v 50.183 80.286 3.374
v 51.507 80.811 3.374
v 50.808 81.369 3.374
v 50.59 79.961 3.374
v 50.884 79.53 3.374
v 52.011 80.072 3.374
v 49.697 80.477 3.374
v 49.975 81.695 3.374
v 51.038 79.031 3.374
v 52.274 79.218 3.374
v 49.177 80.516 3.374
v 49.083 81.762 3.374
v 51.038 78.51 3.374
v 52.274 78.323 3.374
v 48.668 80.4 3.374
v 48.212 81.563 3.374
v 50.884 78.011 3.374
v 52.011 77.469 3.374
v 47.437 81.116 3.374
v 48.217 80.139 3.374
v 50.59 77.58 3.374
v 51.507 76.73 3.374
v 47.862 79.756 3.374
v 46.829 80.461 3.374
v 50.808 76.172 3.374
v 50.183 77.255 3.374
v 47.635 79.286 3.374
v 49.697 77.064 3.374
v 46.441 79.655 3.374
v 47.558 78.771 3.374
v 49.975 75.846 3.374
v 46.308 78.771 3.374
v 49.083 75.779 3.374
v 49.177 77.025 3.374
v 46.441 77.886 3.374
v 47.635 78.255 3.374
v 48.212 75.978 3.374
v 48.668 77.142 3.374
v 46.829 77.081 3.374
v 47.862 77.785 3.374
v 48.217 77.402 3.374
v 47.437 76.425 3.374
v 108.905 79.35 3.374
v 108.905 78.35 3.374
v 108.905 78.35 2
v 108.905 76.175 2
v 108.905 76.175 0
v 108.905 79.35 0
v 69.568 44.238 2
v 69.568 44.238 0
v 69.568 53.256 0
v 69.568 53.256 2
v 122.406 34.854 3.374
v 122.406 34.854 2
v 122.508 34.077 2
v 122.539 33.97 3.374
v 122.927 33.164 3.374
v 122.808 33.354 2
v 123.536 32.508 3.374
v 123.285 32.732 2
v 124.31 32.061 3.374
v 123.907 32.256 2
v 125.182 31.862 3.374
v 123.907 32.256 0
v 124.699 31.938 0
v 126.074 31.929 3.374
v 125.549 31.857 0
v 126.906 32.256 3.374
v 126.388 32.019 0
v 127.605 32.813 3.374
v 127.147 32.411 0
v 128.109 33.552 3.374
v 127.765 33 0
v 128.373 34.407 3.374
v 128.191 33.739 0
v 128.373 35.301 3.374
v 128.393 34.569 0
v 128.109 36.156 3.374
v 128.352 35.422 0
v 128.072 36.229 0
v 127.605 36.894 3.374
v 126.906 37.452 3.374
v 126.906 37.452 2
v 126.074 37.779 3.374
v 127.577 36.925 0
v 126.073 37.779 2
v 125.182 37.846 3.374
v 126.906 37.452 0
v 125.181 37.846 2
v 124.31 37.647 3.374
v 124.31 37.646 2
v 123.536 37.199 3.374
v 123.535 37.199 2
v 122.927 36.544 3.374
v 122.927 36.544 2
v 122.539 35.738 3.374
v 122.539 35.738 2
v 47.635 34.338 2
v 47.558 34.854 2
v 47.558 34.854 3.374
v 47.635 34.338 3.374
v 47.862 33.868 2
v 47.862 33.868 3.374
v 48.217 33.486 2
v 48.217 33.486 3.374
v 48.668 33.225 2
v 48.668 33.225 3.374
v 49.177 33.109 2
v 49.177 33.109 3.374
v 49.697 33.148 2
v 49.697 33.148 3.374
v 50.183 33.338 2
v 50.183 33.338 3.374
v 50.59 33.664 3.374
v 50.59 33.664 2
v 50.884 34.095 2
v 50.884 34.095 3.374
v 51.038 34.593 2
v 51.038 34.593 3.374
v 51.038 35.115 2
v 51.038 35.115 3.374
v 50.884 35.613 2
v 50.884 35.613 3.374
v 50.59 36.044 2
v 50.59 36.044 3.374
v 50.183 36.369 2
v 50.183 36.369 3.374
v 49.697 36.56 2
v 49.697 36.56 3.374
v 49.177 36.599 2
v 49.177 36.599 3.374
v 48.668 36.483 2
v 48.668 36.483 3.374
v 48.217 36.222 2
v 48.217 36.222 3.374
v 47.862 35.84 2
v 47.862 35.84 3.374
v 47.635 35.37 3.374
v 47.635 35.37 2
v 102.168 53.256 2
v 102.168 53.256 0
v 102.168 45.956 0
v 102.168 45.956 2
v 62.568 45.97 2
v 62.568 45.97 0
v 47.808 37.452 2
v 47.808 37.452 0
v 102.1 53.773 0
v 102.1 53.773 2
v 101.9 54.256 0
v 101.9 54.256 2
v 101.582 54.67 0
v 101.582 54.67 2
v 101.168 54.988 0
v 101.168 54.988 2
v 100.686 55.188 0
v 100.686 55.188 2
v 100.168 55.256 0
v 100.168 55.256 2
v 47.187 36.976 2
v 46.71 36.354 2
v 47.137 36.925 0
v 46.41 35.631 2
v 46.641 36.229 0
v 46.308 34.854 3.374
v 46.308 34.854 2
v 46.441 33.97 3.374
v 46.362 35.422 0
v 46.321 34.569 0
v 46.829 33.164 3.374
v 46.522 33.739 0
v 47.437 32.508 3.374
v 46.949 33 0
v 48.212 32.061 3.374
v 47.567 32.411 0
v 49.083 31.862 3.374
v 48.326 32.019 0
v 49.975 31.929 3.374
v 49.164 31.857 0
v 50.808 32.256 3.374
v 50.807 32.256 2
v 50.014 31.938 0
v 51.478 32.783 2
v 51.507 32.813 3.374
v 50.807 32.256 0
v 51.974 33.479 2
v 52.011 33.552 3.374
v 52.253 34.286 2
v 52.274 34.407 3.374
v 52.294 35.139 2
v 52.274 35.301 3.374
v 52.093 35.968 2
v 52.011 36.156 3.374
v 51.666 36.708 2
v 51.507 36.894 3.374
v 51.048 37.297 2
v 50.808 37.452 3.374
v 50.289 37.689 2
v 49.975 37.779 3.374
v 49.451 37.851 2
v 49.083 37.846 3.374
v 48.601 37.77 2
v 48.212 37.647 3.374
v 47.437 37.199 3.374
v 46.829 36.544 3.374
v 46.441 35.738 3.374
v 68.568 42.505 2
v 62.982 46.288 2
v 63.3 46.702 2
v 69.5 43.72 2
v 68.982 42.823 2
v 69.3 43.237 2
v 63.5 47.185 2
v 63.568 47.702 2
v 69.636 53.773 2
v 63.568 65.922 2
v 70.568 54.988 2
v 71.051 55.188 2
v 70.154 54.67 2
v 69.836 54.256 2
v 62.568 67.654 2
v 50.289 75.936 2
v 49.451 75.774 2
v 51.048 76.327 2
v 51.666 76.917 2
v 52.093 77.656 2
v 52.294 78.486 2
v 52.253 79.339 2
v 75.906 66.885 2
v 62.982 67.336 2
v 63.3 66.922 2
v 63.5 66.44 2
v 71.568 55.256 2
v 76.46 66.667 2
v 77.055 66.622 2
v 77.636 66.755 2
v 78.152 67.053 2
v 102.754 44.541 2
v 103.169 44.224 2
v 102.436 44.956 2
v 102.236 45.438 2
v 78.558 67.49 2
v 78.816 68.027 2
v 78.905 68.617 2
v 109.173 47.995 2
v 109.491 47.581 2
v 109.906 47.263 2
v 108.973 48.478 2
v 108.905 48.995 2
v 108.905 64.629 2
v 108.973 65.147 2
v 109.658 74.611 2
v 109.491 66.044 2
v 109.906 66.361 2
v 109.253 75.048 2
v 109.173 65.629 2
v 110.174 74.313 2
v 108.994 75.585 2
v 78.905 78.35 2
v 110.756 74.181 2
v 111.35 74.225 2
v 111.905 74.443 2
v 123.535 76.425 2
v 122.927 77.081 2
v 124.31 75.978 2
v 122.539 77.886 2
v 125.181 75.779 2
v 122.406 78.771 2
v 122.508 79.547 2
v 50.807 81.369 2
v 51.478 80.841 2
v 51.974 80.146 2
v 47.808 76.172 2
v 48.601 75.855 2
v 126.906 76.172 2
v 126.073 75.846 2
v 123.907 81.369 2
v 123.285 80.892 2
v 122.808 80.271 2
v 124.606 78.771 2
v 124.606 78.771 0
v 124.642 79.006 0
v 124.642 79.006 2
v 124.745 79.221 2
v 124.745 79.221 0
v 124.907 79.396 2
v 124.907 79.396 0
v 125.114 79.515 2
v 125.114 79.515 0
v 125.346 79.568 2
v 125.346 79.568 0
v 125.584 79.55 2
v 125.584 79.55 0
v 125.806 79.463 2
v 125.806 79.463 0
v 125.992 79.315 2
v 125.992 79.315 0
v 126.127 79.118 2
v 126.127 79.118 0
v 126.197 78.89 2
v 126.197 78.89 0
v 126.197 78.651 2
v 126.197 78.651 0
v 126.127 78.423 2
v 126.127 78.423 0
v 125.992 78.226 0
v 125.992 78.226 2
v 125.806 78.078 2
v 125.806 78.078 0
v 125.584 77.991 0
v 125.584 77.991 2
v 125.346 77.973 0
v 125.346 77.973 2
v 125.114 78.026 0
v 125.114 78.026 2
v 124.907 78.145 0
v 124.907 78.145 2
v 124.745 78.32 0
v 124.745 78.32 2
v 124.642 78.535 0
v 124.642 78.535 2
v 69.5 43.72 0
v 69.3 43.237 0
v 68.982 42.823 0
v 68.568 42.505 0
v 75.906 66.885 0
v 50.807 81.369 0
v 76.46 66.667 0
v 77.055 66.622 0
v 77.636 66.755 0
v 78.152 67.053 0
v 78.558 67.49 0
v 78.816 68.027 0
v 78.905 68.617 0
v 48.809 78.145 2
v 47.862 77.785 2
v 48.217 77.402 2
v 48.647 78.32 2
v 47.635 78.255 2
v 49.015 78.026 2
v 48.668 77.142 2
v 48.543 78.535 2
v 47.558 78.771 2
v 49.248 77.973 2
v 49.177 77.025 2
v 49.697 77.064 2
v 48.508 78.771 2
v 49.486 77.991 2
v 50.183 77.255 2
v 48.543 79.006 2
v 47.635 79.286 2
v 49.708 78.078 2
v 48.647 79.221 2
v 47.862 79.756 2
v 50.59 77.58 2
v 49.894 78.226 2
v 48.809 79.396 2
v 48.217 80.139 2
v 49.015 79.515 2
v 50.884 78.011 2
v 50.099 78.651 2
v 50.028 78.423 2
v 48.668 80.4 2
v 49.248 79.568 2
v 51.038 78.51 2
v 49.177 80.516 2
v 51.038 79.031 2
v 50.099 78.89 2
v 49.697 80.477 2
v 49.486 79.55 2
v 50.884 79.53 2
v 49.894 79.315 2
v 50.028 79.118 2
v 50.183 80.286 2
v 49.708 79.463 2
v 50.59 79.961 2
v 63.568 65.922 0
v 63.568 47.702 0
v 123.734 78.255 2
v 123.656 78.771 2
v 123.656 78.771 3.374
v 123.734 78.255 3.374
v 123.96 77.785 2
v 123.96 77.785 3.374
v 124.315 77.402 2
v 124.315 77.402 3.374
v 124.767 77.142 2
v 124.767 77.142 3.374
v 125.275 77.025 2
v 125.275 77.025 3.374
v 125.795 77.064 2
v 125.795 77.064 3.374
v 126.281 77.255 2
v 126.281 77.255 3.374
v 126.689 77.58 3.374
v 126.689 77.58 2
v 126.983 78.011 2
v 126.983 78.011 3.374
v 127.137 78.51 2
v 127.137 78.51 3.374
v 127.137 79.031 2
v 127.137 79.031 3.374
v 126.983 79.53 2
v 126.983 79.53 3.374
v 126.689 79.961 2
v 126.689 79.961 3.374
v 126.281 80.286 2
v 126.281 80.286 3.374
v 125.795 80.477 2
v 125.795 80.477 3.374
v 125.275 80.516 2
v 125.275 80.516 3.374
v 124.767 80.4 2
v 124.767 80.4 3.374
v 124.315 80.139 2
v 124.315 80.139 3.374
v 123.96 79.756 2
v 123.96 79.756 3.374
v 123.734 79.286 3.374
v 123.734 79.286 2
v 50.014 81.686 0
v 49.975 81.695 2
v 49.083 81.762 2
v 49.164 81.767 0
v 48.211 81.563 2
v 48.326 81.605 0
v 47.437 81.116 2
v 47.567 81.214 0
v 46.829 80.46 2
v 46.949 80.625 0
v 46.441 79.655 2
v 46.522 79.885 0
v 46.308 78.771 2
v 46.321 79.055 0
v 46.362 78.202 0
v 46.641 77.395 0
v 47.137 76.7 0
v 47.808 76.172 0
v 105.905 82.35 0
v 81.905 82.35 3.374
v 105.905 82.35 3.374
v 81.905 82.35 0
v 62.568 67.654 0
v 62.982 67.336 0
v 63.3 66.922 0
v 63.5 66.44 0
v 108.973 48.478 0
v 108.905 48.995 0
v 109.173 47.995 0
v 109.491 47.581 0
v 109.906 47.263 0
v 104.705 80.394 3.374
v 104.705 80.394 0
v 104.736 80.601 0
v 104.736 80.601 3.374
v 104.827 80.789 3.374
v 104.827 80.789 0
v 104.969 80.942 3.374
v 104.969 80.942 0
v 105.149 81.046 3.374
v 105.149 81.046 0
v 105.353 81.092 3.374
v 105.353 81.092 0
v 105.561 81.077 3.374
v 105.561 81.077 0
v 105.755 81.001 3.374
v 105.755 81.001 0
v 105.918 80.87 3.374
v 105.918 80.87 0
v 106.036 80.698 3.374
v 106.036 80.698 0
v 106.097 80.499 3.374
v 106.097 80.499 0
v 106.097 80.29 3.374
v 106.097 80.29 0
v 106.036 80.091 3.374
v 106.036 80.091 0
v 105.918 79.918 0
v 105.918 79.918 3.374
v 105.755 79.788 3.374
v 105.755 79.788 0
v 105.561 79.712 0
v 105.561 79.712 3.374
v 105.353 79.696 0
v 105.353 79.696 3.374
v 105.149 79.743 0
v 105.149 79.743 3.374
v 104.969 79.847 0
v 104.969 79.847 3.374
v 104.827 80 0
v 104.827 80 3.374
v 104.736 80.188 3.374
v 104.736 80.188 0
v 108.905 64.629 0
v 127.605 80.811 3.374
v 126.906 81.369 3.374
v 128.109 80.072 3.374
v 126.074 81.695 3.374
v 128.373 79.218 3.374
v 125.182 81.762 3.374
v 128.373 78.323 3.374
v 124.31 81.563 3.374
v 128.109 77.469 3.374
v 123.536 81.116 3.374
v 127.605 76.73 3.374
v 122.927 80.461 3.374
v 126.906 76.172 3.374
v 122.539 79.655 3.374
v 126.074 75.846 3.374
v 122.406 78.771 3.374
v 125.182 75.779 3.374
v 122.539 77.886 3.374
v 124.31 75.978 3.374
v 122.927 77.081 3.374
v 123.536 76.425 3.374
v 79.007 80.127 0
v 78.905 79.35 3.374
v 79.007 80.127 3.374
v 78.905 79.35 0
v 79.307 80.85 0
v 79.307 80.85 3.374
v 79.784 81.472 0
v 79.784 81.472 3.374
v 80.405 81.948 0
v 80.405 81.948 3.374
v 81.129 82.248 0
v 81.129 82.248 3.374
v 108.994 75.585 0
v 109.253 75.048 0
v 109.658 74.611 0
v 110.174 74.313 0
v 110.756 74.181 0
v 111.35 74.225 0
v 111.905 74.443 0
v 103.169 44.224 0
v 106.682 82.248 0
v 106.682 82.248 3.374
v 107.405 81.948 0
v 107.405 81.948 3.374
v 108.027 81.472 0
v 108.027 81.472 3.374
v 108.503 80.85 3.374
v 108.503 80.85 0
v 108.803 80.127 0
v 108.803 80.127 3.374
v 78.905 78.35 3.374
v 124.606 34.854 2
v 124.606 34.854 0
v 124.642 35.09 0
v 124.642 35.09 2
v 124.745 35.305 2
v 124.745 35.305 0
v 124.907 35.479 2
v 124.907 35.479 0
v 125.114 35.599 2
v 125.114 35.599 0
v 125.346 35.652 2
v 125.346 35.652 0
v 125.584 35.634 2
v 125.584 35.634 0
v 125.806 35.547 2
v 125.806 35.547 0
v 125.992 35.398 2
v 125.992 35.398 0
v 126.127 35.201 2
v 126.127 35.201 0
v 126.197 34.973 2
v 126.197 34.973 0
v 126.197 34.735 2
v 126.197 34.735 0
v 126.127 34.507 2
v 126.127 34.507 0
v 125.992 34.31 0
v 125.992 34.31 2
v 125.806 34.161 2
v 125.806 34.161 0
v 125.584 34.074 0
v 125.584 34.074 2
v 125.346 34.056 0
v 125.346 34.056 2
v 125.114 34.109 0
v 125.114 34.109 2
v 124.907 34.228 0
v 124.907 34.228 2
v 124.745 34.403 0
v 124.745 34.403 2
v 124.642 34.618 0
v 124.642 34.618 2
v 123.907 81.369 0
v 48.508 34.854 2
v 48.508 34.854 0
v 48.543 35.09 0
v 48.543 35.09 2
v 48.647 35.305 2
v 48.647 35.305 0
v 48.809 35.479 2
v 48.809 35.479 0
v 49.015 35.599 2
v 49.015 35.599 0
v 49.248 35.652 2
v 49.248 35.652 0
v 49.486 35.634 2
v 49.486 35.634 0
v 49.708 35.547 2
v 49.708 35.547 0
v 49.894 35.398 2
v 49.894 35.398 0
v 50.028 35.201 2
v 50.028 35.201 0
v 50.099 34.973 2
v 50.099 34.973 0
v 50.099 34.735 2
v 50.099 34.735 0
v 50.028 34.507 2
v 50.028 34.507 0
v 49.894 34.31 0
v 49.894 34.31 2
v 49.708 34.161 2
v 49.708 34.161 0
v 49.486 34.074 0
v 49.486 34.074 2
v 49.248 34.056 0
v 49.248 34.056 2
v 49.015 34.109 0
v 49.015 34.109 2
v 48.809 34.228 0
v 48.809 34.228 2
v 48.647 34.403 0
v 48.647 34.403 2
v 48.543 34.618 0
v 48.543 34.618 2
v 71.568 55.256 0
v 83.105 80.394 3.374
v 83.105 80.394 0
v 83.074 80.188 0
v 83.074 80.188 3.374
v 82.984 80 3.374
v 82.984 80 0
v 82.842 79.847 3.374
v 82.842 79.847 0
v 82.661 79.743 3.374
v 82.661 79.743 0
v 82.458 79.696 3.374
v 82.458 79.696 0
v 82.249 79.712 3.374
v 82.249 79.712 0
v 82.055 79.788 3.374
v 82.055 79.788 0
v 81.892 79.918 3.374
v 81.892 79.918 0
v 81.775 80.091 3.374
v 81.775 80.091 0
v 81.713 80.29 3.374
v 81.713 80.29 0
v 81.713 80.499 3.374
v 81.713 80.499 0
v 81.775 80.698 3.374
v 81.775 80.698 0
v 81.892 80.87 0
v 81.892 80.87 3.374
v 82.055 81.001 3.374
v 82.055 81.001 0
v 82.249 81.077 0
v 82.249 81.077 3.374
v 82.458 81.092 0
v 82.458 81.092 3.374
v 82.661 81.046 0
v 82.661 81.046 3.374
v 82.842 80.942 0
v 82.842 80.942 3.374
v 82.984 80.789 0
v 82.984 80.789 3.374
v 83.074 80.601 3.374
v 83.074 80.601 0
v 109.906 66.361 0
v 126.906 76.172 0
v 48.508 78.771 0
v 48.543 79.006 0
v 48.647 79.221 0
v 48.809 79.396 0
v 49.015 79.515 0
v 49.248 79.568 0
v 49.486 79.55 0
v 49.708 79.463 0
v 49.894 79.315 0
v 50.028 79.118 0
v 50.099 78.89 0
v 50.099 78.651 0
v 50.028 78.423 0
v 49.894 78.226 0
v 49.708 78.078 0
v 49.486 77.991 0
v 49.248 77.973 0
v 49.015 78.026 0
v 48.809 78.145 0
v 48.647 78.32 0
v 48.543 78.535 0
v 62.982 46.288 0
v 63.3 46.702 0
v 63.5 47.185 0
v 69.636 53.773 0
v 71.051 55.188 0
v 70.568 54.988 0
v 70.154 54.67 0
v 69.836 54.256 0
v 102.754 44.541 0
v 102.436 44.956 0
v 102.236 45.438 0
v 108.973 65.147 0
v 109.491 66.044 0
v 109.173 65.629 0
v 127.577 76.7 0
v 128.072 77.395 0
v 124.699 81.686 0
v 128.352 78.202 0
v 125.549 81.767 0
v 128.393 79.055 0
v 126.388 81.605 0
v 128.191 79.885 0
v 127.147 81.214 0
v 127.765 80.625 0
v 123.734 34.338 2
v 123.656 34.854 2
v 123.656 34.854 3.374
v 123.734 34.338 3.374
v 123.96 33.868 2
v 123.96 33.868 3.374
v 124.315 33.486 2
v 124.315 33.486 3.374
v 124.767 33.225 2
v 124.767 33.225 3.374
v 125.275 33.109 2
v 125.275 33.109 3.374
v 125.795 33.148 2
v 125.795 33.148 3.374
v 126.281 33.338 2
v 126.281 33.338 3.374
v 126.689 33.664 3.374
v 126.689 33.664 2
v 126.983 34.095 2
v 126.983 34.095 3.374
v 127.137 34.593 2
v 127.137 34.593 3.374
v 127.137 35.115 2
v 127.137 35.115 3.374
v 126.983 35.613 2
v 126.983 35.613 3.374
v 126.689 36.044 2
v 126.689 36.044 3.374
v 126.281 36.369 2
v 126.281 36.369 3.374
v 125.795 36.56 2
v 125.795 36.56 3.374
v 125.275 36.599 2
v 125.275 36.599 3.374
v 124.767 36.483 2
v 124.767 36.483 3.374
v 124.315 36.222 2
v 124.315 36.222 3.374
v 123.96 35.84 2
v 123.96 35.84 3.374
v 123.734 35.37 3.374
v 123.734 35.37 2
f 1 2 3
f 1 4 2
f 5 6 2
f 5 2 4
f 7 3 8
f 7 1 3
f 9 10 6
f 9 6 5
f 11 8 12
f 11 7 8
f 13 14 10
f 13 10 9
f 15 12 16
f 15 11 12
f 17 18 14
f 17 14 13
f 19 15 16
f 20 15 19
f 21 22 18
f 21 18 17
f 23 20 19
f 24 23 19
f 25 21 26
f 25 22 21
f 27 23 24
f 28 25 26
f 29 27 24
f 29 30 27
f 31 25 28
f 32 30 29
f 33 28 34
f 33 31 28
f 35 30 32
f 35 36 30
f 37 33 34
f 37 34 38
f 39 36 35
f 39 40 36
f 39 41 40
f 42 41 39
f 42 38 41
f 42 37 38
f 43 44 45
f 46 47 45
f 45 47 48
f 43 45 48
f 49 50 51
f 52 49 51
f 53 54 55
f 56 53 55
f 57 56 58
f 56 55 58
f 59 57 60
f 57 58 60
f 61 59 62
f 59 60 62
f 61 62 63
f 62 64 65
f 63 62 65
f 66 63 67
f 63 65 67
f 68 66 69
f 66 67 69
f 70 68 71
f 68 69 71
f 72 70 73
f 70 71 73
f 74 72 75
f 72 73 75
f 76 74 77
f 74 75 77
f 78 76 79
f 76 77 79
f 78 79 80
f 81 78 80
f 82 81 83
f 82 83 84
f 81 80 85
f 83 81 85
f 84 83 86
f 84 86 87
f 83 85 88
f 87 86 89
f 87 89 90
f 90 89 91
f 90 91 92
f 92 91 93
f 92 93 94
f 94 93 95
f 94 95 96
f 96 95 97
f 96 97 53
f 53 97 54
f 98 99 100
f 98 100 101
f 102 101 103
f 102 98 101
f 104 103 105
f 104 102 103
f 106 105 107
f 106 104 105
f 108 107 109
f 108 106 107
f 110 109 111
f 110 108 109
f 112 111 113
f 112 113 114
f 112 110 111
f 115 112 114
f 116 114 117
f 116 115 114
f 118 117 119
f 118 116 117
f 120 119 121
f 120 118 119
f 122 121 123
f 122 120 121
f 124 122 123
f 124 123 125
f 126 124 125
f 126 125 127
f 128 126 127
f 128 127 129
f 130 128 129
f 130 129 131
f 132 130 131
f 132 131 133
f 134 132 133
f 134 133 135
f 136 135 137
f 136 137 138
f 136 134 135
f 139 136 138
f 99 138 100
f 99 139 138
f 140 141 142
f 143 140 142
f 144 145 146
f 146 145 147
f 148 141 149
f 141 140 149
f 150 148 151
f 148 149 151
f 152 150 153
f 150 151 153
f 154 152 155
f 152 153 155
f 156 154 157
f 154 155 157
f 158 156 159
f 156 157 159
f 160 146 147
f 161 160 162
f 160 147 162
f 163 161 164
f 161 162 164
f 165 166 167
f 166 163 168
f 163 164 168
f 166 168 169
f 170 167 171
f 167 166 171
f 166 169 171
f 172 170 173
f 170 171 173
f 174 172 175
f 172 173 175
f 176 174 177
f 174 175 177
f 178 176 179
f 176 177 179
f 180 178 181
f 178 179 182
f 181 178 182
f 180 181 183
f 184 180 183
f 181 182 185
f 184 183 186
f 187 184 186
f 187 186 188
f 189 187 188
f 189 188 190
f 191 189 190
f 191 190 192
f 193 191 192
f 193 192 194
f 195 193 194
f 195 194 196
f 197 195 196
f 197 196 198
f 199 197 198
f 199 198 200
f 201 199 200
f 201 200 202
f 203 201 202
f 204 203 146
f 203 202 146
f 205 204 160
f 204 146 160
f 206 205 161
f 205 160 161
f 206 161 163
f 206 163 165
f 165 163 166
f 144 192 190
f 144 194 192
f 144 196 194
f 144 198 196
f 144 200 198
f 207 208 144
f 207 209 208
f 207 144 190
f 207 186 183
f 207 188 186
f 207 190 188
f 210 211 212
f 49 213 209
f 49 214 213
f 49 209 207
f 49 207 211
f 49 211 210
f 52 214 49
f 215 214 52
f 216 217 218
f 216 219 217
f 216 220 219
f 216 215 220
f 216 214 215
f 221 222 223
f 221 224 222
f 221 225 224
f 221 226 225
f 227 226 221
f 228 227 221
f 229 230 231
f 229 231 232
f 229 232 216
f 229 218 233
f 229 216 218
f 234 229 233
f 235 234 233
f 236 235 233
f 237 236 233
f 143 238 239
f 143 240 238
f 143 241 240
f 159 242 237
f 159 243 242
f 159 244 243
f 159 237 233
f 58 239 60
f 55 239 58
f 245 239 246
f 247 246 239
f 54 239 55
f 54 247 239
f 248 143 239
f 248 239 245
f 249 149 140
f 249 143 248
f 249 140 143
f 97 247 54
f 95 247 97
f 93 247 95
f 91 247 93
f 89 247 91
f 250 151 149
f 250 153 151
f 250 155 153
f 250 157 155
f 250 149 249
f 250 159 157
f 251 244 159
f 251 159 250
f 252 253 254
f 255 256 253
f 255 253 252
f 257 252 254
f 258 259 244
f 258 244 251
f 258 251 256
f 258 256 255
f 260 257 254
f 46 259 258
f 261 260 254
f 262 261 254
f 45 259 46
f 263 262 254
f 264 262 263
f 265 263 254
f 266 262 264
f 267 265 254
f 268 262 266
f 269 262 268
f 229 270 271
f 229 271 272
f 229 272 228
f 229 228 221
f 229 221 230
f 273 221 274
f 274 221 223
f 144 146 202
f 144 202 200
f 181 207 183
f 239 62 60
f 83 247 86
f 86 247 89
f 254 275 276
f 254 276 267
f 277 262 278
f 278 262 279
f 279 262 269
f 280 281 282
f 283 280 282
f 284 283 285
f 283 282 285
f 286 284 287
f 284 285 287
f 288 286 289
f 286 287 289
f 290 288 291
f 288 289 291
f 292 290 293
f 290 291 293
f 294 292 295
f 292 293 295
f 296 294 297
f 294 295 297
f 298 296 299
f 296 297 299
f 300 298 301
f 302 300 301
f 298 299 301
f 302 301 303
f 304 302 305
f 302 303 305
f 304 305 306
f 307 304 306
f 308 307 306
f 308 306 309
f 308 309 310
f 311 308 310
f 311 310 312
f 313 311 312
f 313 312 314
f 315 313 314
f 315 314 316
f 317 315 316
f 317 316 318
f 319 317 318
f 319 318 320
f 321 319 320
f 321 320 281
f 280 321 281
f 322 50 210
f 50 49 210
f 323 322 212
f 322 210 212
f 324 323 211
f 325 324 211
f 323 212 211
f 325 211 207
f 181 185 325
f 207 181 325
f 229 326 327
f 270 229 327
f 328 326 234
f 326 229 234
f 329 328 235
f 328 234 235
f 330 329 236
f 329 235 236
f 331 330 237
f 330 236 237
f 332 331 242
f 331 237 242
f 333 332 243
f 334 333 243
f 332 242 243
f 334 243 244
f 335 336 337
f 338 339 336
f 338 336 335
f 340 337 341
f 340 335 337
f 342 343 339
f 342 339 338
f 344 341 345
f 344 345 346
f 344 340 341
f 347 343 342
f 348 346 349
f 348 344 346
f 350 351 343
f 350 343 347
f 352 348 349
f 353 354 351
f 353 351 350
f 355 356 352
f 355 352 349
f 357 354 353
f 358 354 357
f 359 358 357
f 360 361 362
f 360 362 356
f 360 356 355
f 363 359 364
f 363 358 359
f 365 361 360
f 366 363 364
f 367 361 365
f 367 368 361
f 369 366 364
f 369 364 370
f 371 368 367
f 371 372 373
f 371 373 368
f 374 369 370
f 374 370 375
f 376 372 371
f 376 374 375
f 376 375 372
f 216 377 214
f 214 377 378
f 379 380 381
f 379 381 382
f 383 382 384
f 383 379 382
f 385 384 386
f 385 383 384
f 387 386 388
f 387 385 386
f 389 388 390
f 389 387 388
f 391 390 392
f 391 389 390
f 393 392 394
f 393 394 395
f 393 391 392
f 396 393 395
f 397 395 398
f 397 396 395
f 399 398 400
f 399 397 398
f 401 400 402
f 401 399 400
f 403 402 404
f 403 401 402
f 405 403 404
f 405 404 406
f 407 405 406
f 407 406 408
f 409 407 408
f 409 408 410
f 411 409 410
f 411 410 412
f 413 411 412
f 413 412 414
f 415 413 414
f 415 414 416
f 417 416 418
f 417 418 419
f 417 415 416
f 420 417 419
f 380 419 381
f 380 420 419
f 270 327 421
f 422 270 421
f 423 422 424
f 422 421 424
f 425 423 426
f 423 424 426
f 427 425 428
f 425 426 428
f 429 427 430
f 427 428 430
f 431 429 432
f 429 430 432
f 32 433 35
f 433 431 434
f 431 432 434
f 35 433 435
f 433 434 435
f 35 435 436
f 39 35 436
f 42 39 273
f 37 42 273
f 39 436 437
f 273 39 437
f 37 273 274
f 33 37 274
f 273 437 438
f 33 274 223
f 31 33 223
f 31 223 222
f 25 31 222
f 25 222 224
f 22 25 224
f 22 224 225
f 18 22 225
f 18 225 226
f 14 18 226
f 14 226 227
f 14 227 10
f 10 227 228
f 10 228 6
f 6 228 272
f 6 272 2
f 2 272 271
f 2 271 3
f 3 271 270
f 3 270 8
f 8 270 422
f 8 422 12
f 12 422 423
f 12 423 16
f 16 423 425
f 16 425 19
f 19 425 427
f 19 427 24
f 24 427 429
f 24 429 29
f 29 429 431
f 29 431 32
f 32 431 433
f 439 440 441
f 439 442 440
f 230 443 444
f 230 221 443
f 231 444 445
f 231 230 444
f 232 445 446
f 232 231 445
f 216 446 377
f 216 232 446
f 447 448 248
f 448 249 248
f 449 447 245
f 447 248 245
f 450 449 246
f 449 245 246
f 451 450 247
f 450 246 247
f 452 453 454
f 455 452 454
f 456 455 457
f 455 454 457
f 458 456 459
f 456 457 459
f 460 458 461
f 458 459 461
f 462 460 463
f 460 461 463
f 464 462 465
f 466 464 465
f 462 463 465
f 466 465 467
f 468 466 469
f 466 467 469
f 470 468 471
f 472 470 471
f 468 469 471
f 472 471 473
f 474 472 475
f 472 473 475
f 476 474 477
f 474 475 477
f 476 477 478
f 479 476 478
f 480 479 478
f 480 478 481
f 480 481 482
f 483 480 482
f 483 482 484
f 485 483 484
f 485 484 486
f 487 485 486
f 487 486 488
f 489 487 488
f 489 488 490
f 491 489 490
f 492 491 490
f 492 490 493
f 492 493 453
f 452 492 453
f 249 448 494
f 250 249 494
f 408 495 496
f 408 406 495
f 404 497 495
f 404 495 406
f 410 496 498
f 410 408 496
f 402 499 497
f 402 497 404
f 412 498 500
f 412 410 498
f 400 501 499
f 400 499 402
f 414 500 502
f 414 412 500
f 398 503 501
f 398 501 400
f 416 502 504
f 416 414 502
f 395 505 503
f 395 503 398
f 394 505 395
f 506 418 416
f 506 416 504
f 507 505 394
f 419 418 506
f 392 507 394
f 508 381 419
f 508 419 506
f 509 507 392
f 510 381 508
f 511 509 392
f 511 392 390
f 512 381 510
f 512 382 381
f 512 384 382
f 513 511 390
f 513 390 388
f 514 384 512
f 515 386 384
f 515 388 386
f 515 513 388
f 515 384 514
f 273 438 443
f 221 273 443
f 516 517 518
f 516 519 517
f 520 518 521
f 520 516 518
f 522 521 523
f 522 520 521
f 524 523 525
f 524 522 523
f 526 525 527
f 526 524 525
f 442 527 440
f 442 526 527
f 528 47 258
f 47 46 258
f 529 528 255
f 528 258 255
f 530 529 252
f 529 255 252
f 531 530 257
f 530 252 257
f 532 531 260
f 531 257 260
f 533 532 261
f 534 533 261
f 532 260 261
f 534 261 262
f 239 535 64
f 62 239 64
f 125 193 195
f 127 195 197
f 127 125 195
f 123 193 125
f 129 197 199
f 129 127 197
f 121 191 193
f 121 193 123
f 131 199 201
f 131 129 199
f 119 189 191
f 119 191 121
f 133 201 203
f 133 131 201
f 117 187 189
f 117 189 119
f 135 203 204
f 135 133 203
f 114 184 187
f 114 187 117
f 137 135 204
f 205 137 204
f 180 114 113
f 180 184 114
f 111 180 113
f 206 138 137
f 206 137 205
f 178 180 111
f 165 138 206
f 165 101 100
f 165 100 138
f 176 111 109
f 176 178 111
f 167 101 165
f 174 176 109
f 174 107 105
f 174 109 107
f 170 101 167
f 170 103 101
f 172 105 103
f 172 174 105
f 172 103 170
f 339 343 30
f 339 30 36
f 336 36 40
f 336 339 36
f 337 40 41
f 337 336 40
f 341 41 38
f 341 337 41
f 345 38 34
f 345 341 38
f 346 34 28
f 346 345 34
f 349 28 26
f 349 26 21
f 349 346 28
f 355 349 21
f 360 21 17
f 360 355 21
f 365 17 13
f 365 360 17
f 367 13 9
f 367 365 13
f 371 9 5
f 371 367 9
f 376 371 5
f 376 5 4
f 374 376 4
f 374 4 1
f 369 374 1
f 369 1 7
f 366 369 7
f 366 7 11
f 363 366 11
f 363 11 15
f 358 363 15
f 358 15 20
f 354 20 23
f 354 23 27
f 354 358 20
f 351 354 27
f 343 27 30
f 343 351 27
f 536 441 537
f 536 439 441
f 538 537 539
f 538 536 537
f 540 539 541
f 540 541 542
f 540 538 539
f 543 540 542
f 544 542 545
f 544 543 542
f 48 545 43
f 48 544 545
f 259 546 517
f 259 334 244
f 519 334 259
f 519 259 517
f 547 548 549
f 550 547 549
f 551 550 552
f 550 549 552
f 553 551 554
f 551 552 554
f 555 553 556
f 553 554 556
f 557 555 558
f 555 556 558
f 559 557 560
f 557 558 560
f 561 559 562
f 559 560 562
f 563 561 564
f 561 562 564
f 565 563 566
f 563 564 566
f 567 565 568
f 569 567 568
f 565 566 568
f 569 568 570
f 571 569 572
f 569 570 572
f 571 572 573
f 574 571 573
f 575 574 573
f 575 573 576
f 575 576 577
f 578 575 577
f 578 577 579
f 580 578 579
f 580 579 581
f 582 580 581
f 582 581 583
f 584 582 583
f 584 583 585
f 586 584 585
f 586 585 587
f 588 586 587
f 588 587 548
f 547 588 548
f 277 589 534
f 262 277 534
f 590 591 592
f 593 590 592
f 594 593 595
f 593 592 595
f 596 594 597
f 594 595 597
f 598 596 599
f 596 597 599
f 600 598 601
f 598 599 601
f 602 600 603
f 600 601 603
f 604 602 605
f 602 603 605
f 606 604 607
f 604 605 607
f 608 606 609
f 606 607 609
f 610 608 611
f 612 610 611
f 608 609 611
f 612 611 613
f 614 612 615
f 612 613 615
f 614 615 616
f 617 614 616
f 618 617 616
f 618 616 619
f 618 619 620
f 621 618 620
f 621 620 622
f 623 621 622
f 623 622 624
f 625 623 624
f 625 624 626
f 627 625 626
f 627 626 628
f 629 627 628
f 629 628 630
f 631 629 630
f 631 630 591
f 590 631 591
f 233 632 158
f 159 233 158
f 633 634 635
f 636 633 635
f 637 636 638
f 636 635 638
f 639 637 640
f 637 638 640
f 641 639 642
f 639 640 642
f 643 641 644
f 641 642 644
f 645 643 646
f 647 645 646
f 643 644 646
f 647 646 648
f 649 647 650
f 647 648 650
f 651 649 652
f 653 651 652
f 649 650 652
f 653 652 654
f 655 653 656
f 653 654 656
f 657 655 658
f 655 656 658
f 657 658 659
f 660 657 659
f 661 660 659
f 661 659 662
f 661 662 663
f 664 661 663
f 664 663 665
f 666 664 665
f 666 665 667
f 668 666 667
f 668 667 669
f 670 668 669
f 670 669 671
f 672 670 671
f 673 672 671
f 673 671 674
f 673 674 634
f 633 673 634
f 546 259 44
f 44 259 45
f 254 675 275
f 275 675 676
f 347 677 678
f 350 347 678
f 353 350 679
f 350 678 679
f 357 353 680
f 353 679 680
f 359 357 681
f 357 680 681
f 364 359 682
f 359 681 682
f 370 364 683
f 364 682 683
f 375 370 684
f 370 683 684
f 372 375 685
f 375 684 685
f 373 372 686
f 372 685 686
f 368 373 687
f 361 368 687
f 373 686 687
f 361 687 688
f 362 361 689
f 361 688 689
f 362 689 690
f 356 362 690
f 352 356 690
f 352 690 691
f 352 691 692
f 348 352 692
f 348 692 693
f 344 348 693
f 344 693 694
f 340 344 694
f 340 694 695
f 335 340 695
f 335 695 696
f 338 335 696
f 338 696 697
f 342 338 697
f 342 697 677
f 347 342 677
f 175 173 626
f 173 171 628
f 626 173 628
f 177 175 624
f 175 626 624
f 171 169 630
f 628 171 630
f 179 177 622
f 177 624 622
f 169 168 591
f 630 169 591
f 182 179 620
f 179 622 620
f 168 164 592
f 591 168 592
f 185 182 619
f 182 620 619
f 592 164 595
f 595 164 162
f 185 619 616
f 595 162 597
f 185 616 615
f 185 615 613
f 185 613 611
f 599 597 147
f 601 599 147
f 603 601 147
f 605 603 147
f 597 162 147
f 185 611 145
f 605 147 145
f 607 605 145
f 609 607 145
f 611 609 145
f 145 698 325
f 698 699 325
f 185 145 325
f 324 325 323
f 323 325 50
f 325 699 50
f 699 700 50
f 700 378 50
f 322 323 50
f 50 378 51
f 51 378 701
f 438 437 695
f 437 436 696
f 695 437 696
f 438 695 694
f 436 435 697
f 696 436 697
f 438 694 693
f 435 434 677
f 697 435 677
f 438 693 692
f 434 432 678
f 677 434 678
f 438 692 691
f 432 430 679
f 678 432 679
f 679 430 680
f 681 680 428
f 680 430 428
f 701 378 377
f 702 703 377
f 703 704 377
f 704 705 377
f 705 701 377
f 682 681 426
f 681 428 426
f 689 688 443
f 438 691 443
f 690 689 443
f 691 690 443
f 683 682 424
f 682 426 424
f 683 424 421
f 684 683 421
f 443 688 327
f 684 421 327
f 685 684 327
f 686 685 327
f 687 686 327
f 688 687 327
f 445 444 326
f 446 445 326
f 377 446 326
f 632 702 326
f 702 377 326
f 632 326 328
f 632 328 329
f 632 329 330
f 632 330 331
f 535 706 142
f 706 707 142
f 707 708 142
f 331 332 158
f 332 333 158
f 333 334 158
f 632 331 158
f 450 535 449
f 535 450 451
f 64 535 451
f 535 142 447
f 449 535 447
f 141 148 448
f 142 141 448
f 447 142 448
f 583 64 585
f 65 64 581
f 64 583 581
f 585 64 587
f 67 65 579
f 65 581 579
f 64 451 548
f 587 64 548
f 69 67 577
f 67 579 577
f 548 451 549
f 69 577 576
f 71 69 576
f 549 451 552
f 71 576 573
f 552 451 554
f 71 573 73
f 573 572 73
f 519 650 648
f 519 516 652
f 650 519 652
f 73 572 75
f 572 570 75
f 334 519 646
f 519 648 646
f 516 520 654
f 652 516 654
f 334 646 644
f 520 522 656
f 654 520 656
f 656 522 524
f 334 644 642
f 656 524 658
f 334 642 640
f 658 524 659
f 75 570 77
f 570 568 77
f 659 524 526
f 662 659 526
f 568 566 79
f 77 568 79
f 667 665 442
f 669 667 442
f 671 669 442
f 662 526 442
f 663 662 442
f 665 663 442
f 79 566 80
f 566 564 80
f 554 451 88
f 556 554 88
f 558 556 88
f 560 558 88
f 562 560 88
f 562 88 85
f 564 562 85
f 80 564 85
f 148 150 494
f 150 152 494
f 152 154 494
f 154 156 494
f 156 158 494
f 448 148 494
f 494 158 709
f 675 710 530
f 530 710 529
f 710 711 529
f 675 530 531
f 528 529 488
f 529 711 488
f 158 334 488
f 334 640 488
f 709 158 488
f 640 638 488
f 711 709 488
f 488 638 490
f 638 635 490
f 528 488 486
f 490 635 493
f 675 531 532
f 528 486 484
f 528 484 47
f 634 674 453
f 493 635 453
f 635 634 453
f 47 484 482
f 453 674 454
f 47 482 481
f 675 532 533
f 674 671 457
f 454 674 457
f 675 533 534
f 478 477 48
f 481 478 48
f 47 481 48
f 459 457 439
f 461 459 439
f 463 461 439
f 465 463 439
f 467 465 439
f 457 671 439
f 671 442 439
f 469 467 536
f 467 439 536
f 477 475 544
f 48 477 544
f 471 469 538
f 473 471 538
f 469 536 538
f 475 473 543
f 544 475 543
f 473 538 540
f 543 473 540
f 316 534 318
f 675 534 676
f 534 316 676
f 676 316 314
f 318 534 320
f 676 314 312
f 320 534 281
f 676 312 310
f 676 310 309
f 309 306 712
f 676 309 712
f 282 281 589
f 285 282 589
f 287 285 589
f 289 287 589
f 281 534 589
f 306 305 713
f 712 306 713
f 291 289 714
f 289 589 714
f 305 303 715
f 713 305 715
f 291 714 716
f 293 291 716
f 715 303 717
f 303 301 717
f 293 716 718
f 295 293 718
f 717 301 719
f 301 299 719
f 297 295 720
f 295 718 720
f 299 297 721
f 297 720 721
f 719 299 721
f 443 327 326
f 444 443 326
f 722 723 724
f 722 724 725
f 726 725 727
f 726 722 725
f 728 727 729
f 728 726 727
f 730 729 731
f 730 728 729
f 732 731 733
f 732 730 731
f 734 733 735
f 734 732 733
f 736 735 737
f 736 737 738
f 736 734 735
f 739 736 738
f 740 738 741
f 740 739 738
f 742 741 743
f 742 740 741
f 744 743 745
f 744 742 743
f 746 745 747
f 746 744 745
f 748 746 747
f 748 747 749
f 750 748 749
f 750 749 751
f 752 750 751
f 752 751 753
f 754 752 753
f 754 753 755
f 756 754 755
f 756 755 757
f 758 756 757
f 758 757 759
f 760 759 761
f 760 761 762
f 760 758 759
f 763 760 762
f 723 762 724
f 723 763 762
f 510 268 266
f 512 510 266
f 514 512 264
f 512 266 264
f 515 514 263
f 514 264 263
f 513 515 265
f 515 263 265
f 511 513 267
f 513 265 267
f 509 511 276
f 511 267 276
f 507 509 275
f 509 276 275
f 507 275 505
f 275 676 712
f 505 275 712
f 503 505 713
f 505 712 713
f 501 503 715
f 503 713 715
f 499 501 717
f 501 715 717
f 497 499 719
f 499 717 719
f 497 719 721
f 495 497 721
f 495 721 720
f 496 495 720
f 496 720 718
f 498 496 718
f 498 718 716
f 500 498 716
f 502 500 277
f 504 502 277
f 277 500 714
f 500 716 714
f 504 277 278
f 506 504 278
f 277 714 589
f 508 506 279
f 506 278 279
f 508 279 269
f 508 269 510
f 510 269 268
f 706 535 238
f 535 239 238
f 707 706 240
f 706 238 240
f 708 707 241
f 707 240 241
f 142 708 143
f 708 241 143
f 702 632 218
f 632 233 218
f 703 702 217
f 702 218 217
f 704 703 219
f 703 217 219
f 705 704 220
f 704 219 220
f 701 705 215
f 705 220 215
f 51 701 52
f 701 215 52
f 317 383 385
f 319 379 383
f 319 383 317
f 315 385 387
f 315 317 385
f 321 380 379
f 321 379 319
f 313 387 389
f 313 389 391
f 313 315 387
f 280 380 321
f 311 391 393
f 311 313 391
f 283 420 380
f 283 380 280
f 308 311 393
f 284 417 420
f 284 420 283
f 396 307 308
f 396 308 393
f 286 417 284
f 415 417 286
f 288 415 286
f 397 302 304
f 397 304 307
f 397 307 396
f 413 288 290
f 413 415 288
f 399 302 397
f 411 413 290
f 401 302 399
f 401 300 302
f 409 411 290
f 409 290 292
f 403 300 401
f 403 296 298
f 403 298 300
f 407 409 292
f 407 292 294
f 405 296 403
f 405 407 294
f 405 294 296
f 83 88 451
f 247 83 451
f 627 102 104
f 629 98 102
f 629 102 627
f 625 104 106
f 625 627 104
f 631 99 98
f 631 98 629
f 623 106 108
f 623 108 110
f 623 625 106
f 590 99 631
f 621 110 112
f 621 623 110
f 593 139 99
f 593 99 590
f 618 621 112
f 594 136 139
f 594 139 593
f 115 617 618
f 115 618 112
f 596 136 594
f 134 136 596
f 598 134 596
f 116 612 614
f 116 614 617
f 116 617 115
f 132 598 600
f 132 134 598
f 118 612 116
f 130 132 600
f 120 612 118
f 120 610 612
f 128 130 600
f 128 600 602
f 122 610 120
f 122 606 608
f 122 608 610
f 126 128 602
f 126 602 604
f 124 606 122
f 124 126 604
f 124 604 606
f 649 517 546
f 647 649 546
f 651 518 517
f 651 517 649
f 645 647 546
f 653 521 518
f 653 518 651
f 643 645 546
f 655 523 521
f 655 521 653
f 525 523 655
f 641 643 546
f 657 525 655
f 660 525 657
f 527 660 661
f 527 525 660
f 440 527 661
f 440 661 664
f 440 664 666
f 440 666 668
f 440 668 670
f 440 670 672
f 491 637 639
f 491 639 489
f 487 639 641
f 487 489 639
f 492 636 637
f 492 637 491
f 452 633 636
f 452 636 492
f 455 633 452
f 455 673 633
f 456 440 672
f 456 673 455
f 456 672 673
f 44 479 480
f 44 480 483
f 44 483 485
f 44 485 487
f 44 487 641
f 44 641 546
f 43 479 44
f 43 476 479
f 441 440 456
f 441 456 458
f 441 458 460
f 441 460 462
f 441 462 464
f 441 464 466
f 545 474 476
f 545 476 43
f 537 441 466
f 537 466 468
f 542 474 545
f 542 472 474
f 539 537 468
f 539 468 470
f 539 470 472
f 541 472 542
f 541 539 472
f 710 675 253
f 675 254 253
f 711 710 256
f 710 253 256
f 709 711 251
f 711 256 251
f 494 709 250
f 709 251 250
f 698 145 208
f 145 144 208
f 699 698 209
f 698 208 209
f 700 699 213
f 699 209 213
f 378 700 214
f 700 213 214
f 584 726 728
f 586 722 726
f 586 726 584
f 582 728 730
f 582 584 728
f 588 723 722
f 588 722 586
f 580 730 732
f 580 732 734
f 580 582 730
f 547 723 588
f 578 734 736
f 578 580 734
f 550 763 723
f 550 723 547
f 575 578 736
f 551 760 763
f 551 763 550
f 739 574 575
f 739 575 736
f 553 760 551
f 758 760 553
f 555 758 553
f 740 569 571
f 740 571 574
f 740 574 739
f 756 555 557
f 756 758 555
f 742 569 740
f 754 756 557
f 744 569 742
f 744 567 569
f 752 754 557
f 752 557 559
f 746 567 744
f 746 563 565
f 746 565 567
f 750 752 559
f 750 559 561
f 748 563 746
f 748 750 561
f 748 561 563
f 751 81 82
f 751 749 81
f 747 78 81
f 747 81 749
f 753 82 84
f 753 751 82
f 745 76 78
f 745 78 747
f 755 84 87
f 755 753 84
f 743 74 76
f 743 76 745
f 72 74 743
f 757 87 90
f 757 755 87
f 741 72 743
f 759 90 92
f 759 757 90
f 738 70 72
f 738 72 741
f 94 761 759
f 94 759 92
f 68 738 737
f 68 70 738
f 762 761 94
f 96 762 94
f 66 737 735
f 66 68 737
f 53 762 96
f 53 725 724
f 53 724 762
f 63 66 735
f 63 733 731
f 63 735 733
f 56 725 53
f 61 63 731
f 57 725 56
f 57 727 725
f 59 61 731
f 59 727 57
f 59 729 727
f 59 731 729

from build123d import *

# Parameters (mm, degrees)
BOSS_EXTRUDE1_DEPTH = 2
SKETCH2_R           = 3
SKETCH2_R_2         = 1.75
BOSS_EXTRUDE2_DEPTH = 1.3744
FILLET1_R           = 2
CUT_EXTRUDE1_REACH  = 154.581
SKETCH3_R           = 0.8
SKETCH6_W           = 30
SKETCH6_H           = 4
BOSS_EXTRUDE4_DEPTH = 1.3744
SKETCH7_R           = 0.7
CUT_EXTRUDE3_DEPTH  = 153.581315805
FILLET2_R           = 3


with BuildPart() as part:
    # Sketch1 → Boss-Extrude1 (new body)
    with BuildSketch(Plane.XY):
        with BuildLine():
            Line((47.808137976, 76.172186055), (63.568277585, 67.076965299))
            Line((63.568277585, 67.076965299), (63.568277585, 46.547516))
            Line((63.568277585, 46.547516), (47.808137976, 37.452295245))
            ThreePointArc((47.808137976, 37.452295245), (46.709301103, 33.354422928), (50.80717342, 32.255586055))
            Line((50.80717342, 32.255586055), (69.568277585, 43.082671869))
            Line((69.568277585, 43.082671869), (69.568277585, 55.255795635))
            Line((69.568277585, 55.255795635), (102.168277585, 55.255795635))
            Line((102.168277585, 55.255795635), (102.168277585, 44.800797075))
            Line((102.168277585, 44.800797075), (123.906537976, 32.255586055))
            ThreePointArc((123.906537976, 32.255586055), (128.004410293, 33.354422928), (126.90557342, 37.452295245))
            Line((126.90557342, 37.452295245), (108.905229152, 47.84034439))
            Line((108.905229152, 47.84034439), (108.905229152, 65.784136909))
            Line((108.905229152, 65.784136909), (126.90557342, 76.172186055))
            ThreePointArc((126.90557342, 76.172186055), (128.004410293, 80.270058372), (123.906537976, 81.368895245))
            Line((123.906537976, 81.368895245), (108.905229152, 72.711597862))
            Line((108.905229152, 72.711597862), (108.905229152, 82.35020472))
            Line((108.905229152, 82.35020472), (78.905229152, 82.35020472))
            Line((78.905229152, 82.35020472), (78.905229152, 65.153428503))
            Line((78.905229152, 65.153428503), (50.80717342, 81.368895245))
            ThreePointArc((50.80717342, 81.368895245), (46.709301103, 80.270058372), (47.808137976, 76.172186055))
        make_face()
    extrude(amount=BOSS_EXTRUDE1_DEPTH)

    # Sketch2 → Boss-Extrude2 (add)
    # profile 1 of 4: a face of its own
    with BuildSketch(Plane.XY.offset(2)):
        with Locations(Location((49.307655698, 78.77054065, 0), (0, 0, 180))):
            Circle(SKETCH2_R)
        with Locations(Location((49.307655698, 78.77054065, 0), (0, 0, 180))):
            Circle(SKETCH2_R_2, mode=Mode.SUBTRACT)
    # profile 2 of 4: a face of its own
    with BuildSketch(Plane.XY.offset(2)):
        with Locations(Location((49.307655698, 34.85394065, 0), (0, 0, 180))):
            Circle(SKETCH2_R)
        with Locations(Location((49.307655698, 34.85394065, 0), (0, 0, 180))):
            Circle(SKETCH2_R_2, mode=Mode.SUBTRACT)
    # profile 3 of 4: a face of its own
    with BuildSketch(Plane.XY.offset(2)):
        with Locations(Location((125.406055698, 34.85394065, 0), (0, 0, 180))):
            Circle(SKETCH2_R)
        with Locations(Location((125.406055698, 34.85394065, 0), (0, 0, 180))):
            Circle(SKETCH2_R_2, mode=Mode.SUBTRACT)
    # profile 4 of 4: a face of its own
    with BuildSketch(Plane.XY.offset(2)):
        with Locations(Location((125.406055698, 78.77054065, 0), (0, 0, 180))):
            Circle(SKETCH2_R)
        with Locations(Location((125.406055698, 78.77054065, 0), (0, 0, 180))):
            Circle(SKETCH2_R_2, mode=Mode.SUBTRACT)
    extrude(amount=BOSS_EXTRUDE2_DEPTH)

    # Fillet1
    fillet1_edges = [part.edges().sort_by_distance(p)[0] for p in [
        (69.568277585, 43.082671869, 1),
        (63.568277585, 46.547516, 1),
        (63.568277585, 67.076965299, 1),
        (78.905229152, 65.153428503, 1),
        (108.905229152, 72.711597862, 1),
        (108.905229152, 65.784136909, 1),
        (108.905229152, 47.84034439, 1),
        (102.168277585, 44.800797075, 1),
        (102.168277585, 55.255795635, 1),
        (69.568277585, 55.255795635, 1),
    ]]
    fillet(fillet1_edges, radius=FILLET1_R)

    # Sketch3 → Cut-Extrude1 (cut, up to next)
    with BuildSketch(Plane(origin=(0, 0, 0), x_dir=(-1, 0, 0), z_dir=(0, 0, -1)), mode=Mode.PRIVATE) as cut_extrude1_sk1:
        with Locations((-125.406055698, 78.77054065)):
            Circle(SKETCH3_R)
    cut_extrude1_tool1 = extrude(cut_extrude1_sk1.sketch, amount=-CUT_EXTRUDE1_REACH, mode=Mode.PRIVATE) & part.part
    # Sketch3 → Cut-Extrude1 (cut, up to next)
    with BuildSketch(Plane(origin=(0, 0, 0), x_dir=(-1, 0, 0), z_dir=(0, 0, -1)), mode=Mode.PRIVATE) as cut_extrude1_sk2:
        with Locations((-125.406055698, 34.85394065)):
            Circle(SKETCH3_R)
    cut_extrude1_tool2 = extrude(cut_extrude1_sk2.sketch, amount=-CUT_EXTRUDE1_REACH, mode=Mode.PRIVATE) & part.part
    # Sketch3 → Cut-Extrude1 (cut, up to next)
    with BuildSketch(Plane(origin=(0, 0, 0), x_dir=(-1, 0, 0), z_dir=(0, 0, -1)), mode=Mode.PRIVATE) as cut_extrude1_sk3:
        with Locations((-49.307655698, 34.85394065)):
            Circle(SKETCH3_R)
    cut_extrude1_tool3 = extrude(cut_extrude1_sk3.sketch, amount=-CUT_EXTRUDE1_REACH, mode=Mode.PRIVATE) & part.part
    # Sketch3 → Cut-Extrude1 (cut, up to next)
    with BuildSketch(Plane(origin=(0, 0, 0), x_dir=(-1, 0, 0), z_dir=(0, 0, -1)), mode=Mode.PRIVATE) as cut_extrude1_sk4:
        with Locations((-49.307655698, 78.77054065)):
            Circle(SKETCH3_R)
    cut_extrude1_tool4 = extrude(cut_extrude1_sk4.sketch, amount=-CUT_EXTRUDE1_REACH, mode=Mode.PRIVATE) & part.part
    add(cut_extrude1_tool1.solids().sort_by_distance((125.406056, 78.770541, 0))[0], mode=Mode.SUBTRACT)
    add(cut_extrude1_tool2.solids().sort_by_distance((125.406056, 34.853941, 0))[0], mode=Mode.SUBTRACT)
    add(cut_extrude1_tool3.solids().sort_by_distance((49.307656, 34.853941, 0))[0], mode=Mode.SUBTRACT)
    add(cut_extrude1_tool4.solids().sort_by_distance((49.307656, 78.770541, 0))[0], mode=Mode.SUBTRACT)

    # Sketch6 → Boss-Extrude4 (add)
    with BuildSketch(Plane.XY.offset(2)):
        with Locations((93.905229152, 80.35020472)):
            Rectangle(SKETCH6_W, SKETCH6_H)
    extrude(amount=BOSS_EXTRUDE4_DEPTH)

    # Sketch7 → Cut-Extrude3 (cut, through all)
    with BuildSketch(Plane(origin=(0, 0, 0), x_dir=(-1, 0, 0), z_dir=(0, 0, -1))):
        with Locations((-105.405229152, 80.39430472)):
            Circle(SKETCH7_R)
        with Locations(Location((-82.405229152, 80.39430472, 0), (0, 0, 180))):
            Circle(SKETCH7_R)
    extrude(amount=-CUT_EXTRUDE3_DEPTH, mode=Mode.SUBTRACT)

    # Fillet2
    fillet2_edges = [part.edges().sort_by_distance(p)[0] for p in [
        (78.905229152, 82.35020472, 1.6872),
        (108.905229152, 82.35020472, 1.6872),
    ]]
    fillet(fillet2_edges, radius=FILLET2_R)


solid = part.part
